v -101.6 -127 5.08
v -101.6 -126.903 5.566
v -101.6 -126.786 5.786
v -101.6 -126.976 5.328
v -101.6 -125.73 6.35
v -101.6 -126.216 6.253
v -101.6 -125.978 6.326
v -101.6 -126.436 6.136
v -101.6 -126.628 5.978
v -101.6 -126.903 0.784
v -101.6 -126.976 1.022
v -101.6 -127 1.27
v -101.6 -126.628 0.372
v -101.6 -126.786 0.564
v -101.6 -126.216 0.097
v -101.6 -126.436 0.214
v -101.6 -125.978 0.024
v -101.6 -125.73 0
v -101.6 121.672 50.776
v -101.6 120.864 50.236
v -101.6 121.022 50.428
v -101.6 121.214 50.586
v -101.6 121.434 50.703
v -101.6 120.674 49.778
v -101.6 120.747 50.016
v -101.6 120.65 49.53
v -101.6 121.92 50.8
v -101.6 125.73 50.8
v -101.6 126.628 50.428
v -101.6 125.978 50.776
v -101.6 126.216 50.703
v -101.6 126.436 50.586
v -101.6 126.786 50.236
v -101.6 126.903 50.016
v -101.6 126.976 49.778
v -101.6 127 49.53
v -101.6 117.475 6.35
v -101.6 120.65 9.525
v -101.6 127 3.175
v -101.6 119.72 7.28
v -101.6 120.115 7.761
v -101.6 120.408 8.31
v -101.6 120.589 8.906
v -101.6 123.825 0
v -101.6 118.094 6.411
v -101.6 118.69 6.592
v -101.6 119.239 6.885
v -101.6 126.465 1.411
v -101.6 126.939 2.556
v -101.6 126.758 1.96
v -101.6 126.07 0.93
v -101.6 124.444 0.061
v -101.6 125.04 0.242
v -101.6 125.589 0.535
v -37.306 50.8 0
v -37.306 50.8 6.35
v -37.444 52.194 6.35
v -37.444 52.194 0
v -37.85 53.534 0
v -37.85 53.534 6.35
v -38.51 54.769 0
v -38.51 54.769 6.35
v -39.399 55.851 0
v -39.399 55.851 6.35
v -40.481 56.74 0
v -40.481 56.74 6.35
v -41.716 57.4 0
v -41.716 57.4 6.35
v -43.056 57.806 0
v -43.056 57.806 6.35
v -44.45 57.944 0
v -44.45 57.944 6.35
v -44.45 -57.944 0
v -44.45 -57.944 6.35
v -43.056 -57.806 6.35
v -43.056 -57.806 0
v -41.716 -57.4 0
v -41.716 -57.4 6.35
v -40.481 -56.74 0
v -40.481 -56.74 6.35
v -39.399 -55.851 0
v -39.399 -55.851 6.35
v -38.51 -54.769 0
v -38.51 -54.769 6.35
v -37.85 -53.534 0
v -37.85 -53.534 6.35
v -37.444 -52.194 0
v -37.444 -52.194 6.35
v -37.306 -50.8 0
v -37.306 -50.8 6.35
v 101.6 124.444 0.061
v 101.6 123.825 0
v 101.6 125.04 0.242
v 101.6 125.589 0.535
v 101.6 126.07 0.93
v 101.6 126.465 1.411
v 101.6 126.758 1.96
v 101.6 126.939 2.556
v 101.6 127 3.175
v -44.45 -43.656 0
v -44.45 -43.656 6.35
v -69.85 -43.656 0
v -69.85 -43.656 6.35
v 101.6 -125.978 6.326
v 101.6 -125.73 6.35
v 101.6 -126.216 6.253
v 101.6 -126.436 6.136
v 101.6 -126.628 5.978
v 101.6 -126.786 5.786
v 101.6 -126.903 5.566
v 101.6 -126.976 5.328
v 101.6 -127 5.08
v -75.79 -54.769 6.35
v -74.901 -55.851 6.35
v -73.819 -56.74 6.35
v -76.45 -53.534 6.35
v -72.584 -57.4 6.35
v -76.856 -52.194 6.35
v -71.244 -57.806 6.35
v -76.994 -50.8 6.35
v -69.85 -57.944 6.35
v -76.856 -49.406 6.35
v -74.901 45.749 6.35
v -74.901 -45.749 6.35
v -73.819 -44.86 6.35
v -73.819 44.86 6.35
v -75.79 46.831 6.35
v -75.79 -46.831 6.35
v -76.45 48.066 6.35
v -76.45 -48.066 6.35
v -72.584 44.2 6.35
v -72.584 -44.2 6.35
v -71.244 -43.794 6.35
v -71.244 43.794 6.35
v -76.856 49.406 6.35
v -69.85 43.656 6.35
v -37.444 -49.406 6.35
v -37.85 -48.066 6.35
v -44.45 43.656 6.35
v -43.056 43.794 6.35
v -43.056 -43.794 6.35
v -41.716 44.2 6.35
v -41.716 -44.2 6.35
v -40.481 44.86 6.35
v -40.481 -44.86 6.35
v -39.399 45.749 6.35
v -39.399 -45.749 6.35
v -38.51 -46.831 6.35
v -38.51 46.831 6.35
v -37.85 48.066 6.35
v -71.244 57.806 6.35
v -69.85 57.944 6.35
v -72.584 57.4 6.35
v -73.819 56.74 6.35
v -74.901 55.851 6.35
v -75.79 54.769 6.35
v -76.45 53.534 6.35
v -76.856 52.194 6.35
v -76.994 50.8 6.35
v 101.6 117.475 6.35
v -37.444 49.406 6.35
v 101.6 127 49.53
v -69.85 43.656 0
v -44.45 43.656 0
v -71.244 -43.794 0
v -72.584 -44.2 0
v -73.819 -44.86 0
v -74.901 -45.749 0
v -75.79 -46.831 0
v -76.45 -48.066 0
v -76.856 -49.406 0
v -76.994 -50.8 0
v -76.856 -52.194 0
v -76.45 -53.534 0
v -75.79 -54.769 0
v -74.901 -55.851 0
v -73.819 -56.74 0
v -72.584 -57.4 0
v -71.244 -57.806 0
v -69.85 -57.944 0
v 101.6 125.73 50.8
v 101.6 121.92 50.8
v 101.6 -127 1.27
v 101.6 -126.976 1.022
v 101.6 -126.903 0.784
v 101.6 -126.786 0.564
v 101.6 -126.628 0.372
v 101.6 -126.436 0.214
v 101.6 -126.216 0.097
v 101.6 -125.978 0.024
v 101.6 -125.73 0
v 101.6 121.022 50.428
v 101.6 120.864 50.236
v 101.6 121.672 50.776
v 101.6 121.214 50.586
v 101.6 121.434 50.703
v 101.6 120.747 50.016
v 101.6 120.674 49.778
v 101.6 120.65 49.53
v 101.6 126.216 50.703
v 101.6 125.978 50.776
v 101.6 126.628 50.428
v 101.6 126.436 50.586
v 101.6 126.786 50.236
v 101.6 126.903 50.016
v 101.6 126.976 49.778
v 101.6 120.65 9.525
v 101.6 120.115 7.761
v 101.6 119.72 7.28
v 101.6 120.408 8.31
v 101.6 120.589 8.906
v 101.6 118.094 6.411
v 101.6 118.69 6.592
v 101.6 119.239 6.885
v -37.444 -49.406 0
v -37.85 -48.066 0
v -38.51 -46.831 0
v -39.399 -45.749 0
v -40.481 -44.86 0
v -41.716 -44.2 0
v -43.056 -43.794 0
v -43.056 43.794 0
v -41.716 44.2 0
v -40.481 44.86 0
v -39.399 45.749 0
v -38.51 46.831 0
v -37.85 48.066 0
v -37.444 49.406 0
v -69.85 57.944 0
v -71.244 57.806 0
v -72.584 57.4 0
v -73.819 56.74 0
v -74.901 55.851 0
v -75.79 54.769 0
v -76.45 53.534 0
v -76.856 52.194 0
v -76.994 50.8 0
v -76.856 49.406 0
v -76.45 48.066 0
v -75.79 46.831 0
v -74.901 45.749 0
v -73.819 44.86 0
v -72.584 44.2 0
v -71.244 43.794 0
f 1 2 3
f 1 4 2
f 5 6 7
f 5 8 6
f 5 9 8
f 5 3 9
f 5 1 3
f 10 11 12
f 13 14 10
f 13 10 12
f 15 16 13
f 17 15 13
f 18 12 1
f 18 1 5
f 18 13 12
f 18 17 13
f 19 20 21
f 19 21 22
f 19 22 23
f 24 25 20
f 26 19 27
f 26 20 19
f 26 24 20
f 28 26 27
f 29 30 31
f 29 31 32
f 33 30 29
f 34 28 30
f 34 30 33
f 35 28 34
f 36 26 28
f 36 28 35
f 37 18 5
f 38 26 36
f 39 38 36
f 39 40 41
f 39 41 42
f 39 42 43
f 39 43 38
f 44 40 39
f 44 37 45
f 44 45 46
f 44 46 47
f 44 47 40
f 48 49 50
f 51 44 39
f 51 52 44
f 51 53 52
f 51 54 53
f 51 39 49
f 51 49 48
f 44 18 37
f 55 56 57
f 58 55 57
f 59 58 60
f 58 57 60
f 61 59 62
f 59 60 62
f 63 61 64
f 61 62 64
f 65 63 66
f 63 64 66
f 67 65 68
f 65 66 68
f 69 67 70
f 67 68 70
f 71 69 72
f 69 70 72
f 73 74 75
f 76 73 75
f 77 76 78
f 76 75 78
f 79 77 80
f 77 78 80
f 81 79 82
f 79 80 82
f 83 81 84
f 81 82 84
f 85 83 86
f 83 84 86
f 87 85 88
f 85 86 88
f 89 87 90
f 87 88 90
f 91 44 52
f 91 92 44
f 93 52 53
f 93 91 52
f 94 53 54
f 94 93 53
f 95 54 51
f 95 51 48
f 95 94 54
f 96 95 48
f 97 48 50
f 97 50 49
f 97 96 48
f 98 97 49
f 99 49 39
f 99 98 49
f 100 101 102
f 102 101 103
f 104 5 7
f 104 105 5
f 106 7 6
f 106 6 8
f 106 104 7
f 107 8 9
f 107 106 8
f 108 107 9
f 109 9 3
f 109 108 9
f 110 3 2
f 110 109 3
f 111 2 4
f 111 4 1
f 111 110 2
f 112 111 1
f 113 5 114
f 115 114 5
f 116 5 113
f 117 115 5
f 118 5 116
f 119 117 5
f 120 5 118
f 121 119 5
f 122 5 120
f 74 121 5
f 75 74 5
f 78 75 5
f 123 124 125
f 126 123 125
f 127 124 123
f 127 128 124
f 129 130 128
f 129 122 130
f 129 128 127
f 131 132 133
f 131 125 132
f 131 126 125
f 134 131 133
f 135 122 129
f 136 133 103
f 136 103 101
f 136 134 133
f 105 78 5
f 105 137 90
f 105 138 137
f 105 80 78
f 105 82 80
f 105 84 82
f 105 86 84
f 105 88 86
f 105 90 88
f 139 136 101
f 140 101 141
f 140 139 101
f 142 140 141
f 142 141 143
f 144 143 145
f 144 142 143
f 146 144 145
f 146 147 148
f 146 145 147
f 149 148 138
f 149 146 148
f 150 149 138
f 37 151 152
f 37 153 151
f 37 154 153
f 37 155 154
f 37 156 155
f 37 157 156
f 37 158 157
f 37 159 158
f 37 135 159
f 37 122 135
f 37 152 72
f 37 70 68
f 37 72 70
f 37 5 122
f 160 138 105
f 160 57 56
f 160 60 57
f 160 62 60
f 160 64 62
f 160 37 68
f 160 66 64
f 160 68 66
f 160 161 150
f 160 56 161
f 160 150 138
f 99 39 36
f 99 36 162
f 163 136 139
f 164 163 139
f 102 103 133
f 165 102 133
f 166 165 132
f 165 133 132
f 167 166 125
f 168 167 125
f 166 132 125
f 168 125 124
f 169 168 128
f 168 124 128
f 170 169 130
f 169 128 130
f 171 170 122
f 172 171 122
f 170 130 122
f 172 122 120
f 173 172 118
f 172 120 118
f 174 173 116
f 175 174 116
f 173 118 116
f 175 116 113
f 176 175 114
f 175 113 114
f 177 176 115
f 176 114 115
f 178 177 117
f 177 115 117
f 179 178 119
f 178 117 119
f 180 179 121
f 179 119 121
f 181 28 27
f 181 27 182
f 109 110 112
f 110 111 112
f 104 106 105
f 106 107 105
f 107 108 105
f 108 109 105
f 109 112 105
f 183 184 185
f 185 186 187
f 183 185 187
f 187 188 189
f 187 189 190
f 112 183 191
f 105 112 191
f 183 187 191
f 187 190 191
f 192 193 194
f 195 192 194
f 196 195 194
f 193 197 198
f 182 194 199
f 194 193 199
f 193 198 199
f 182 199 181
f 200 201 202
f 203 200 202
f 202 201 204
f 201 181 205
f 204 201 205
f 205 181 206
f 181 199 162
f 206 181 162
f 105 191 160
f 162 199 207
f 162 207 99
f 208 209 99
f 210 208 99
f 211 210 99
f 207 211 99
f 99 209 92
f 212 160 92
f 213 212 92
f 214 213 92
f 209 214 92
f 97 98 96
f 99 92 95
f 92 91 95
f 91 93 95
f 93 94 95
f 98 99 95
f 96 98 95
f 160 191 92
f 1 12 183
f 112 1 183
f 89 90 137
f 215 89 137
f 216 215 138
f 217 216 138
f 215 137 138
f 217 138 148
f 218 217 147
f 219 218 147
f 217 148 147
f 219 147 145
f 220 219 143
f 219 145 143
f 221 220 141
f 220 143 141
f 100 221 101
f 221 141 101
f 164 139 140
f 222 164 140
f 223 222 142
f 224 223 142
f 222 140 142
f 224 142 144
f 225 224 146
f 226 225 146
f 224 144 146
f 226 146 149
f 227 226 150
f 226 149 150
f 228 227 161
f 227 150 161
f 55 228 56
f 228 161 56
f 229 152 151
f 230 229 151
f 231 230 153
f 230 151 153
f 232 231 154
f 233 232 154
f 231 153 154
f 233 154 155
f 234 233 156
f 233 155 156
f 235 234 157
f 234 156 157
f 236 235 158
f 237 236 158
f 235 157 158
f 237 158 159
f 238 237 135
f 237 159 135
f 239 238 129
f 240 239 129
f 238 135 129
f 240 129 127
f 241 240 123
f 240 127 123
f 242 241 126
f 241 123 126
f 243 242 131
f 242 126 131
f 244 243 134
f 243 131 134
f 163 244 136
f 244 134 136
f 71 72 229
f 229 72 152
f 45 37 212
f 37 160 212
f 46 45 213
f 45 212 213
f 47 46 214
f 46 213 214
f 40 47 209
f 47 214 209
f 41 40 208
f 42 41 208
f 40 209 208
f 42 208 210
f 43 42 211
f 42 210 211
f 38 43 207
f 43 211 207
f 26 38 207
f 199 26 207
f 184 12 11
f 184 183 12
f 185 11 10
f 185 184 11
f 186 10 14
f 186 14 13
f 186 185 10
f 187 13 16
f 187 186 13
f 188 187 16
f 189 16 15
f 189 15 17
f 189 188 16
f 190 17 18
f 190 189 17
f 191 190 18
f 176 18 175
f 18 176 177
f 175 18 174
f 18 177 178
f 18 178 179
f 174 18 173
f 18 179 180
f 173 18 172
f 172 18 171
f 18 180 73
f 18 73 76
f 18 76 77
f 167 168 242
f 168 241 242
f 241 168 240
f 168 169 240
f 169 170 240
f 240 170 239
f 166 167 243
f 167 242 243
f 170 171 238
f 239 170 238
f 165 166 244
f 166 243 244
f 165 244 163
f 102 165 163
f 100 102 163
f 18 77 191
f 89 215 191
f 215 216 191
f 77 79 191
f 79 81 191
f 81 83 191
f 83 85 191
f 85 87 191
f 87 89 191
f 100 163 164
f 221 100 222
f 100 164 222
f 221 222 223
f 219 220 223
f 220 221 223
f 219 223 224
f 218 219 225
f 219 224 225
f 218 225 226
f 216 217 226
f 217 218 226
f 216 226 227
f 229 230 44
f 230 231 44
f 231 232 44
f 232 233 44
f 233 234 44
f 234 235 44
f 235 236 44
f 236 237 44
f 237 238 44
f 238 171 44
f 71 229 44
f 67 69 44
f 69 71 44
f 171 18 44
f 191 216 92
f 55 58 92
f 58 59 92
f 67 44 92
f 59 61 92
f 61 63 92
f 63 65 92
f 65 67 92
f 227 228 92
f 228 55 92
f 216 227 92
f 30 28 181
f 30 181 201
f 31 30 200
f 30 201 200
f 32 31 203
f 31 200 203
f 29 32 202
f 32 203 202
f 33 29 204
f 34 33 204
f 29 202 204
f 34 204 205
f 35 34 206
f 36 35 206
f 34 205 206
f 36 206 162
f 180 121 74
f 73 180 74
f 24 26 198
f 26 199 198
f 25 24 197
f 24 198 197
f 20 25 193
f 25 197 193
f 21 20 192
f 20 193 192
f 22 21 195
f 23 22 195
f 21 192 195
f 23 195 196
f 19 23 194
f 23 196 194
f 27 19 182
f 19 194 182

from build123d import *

# Parameters (mm, degrees)
F0_W     = 203.2
F0_H     = 254
F1_DEPTH = 6.35
F2_W     = 203.2
F2_H     = 6.35
F3_DEPTH = 44.45
F4_R     = 3.175
F6_DEPTH = 25.4
F7_DEPTH = 25.4
F8_R     = 1.27


with BuildPart() as f1:
    # F0 (on Top) → F1 (new body)
    with BuildSketch(Plane.XY):
        Rectangle(F0_W, F0_H)
    extrude(amount=F1_DEPTH)

    # F2 (on face) → F3 (join)
    with BuildSketch(Plane.XY.offset(6.35)):
        with Locations((0, 123.825)):
            Rectangle(F2_W, F2_H)
    extrude(amount=F3_DEPTH)

    # F4
    f4_edges = [f1.edges().sort_by_distance(p)[0] for p in [
        (0, 120.65, 6.35),
        (0, 127, 0),
    ]]
    fillet(f4_edges, radius=F4_R)

    # F5 (on face) → F6 (cut)
    with BuildSketch(Plane.XY.offset(6.35)):
        with BuildLine():
            ThreePointArc((-69.85, -43.65625), (-64.798606, -45.748606), (-62.70625, -50.8))
            ThreePointArc((-62.70625, -50.8), (-64.798606, -55.851394), (-69.85, -57.94375))
            Line((-69.85, -57.94375), (-44.45, -57.94375))
            ThreePointArc((-44.45, -57.94375), (-51.59375, -50.8), (-44.45, -43.65625))
            Line((-44.45, -43.65625), (-69.85, -43.65625))
        make_face()
        with BuildLine():
            ThreePointArc((-37.30625, -50.8), (-39.398606, -45.748606), (-44.45, -43.65625))
            ThreePointArc((-44.45, -43.65625), (-51.59375, -50.8), (-44.45, -57.94375))
            ThreePointArc((-44.45, -57.94375), (-39.398606, -55.851394), (-37.30625, -50.8))
        make_face()
        with BuildLine():
            ThreePointArc((-69.85, -57.94375), (-64.798606, -55.851394), (-62.70625, -50.8))
            ThreePointArc((-62.70625, -50.8), (-64.798606, -45.748606), (-69.85, -43.65625))
            ThreePointArc((-69.85, -43.65625), (-76.99375, -50.8), (-69.85, -57.94375))
        make_face()
    extrude(amount=-F6_DEPTH, mode=Mode.SUBTRACT)

    # F5 (on face) → F7 (cut)
    with BuildSketch(Plane.XY.offset(6.35)):
        with BuildLine():
            ThreePointArc((-69.85, -57.94375), (-64.798606, -55.851394), (-62.70625, -50.8))
            ThreePointArc((-62.70625, -50.8), (-64.798606, -45.748606), (-69.85, -43.65625))
            ThreePointArc((-69.85, -43.65625), (-76.99375, -50.8), (-69.85, -57.94375))
        make_face()
        with BuildLine():
            ThreePointArc((-69.85, -43.65625), (-64.798606, -45.748606), (-62.70625, -50.8))
            ThreePointArc((-62.70625, -50.8), (-64.798606, -55.851394), (-69.85, -57.94375))
            Line((-69.85, -57.94375), (-44.45, -57.94375))
            ThreePointArc((-44.45, -57.94375), (-51.59375, -50.8), (-44.45, -43.65625))
            Line((-44.45, -43.65625), (-69.85, -43.65625))
        make_face()
        with BuildLine():
            ThreePointArc((-37.30625, -50.8), (-39.398606, -45.748606), (-44.45, -43.65625))
            ThreePointArc((-44.45, -43.65625), (-51.59375, -50.8), (-44.45, -57.94375))
            ThreePointArc((-44.45, -57.94375), (-39.398606, -55.851394), (-37.30625, -50.8))
        make_face()
        with BuildLine():
            ThreePointArc((-69.85, 43.65625), (-64.798606, 45.748606), (-62.70625, 50.8))
            ThreePointArc((-62.70625, 50.8), (-64.798606, 55.851394), (-69.85, 57.94375))
            ThreePointArc((-69.85, 57.94375), (-76.99375, 50.8), (-69.85, 43.65625))
        make_face()
        with BuildLine():
            ThreePointArc((-69.85, 57.94375), (-64.798606, 55.851394), (-62.70625, 50.8))
            ThreePointArc((-62.70625, 50.8), (-64.798606, 45.748606), (-69.85, 43.65625))
            Line((-69.85, 43.65625), (-44.45, 43.65625))
            ThreePointArc((-44.45, 43.65625), (-51.59375, 50.8), (-44.45, 57.94375))
            Line((-44.45, 57.94375), (-69.85, 57.94375))
        make_face()
        with BuildLine():
            ThreePointArc((-37.30625, 50.8), (-39.398606, 55.851394), (-44.45, 57.94375))
            ThreePointArc((-44.45, 57.94375), (-51.59375, 50.8), (-44.45, 43.65625))
            ThreePointArc((-44.45, 43.65625), (-39.398606, 45.748606), (-37.30625, 50.8))
        make_face()
    extrude(amount=-F7_DEPTH, mode=Mode.SUBTRACT)

    # F8
    f8_edges = [f1.edges().sort_by_distance(p)[0] for p in [
        (0, -127, 6.35),
        (0, -127, 0),
        (0, 120.65, 50.8),
        (0, 127, 50.8),
    ]]
    fillet(f8_edges, radius=F8_R)


solid = f1.part
